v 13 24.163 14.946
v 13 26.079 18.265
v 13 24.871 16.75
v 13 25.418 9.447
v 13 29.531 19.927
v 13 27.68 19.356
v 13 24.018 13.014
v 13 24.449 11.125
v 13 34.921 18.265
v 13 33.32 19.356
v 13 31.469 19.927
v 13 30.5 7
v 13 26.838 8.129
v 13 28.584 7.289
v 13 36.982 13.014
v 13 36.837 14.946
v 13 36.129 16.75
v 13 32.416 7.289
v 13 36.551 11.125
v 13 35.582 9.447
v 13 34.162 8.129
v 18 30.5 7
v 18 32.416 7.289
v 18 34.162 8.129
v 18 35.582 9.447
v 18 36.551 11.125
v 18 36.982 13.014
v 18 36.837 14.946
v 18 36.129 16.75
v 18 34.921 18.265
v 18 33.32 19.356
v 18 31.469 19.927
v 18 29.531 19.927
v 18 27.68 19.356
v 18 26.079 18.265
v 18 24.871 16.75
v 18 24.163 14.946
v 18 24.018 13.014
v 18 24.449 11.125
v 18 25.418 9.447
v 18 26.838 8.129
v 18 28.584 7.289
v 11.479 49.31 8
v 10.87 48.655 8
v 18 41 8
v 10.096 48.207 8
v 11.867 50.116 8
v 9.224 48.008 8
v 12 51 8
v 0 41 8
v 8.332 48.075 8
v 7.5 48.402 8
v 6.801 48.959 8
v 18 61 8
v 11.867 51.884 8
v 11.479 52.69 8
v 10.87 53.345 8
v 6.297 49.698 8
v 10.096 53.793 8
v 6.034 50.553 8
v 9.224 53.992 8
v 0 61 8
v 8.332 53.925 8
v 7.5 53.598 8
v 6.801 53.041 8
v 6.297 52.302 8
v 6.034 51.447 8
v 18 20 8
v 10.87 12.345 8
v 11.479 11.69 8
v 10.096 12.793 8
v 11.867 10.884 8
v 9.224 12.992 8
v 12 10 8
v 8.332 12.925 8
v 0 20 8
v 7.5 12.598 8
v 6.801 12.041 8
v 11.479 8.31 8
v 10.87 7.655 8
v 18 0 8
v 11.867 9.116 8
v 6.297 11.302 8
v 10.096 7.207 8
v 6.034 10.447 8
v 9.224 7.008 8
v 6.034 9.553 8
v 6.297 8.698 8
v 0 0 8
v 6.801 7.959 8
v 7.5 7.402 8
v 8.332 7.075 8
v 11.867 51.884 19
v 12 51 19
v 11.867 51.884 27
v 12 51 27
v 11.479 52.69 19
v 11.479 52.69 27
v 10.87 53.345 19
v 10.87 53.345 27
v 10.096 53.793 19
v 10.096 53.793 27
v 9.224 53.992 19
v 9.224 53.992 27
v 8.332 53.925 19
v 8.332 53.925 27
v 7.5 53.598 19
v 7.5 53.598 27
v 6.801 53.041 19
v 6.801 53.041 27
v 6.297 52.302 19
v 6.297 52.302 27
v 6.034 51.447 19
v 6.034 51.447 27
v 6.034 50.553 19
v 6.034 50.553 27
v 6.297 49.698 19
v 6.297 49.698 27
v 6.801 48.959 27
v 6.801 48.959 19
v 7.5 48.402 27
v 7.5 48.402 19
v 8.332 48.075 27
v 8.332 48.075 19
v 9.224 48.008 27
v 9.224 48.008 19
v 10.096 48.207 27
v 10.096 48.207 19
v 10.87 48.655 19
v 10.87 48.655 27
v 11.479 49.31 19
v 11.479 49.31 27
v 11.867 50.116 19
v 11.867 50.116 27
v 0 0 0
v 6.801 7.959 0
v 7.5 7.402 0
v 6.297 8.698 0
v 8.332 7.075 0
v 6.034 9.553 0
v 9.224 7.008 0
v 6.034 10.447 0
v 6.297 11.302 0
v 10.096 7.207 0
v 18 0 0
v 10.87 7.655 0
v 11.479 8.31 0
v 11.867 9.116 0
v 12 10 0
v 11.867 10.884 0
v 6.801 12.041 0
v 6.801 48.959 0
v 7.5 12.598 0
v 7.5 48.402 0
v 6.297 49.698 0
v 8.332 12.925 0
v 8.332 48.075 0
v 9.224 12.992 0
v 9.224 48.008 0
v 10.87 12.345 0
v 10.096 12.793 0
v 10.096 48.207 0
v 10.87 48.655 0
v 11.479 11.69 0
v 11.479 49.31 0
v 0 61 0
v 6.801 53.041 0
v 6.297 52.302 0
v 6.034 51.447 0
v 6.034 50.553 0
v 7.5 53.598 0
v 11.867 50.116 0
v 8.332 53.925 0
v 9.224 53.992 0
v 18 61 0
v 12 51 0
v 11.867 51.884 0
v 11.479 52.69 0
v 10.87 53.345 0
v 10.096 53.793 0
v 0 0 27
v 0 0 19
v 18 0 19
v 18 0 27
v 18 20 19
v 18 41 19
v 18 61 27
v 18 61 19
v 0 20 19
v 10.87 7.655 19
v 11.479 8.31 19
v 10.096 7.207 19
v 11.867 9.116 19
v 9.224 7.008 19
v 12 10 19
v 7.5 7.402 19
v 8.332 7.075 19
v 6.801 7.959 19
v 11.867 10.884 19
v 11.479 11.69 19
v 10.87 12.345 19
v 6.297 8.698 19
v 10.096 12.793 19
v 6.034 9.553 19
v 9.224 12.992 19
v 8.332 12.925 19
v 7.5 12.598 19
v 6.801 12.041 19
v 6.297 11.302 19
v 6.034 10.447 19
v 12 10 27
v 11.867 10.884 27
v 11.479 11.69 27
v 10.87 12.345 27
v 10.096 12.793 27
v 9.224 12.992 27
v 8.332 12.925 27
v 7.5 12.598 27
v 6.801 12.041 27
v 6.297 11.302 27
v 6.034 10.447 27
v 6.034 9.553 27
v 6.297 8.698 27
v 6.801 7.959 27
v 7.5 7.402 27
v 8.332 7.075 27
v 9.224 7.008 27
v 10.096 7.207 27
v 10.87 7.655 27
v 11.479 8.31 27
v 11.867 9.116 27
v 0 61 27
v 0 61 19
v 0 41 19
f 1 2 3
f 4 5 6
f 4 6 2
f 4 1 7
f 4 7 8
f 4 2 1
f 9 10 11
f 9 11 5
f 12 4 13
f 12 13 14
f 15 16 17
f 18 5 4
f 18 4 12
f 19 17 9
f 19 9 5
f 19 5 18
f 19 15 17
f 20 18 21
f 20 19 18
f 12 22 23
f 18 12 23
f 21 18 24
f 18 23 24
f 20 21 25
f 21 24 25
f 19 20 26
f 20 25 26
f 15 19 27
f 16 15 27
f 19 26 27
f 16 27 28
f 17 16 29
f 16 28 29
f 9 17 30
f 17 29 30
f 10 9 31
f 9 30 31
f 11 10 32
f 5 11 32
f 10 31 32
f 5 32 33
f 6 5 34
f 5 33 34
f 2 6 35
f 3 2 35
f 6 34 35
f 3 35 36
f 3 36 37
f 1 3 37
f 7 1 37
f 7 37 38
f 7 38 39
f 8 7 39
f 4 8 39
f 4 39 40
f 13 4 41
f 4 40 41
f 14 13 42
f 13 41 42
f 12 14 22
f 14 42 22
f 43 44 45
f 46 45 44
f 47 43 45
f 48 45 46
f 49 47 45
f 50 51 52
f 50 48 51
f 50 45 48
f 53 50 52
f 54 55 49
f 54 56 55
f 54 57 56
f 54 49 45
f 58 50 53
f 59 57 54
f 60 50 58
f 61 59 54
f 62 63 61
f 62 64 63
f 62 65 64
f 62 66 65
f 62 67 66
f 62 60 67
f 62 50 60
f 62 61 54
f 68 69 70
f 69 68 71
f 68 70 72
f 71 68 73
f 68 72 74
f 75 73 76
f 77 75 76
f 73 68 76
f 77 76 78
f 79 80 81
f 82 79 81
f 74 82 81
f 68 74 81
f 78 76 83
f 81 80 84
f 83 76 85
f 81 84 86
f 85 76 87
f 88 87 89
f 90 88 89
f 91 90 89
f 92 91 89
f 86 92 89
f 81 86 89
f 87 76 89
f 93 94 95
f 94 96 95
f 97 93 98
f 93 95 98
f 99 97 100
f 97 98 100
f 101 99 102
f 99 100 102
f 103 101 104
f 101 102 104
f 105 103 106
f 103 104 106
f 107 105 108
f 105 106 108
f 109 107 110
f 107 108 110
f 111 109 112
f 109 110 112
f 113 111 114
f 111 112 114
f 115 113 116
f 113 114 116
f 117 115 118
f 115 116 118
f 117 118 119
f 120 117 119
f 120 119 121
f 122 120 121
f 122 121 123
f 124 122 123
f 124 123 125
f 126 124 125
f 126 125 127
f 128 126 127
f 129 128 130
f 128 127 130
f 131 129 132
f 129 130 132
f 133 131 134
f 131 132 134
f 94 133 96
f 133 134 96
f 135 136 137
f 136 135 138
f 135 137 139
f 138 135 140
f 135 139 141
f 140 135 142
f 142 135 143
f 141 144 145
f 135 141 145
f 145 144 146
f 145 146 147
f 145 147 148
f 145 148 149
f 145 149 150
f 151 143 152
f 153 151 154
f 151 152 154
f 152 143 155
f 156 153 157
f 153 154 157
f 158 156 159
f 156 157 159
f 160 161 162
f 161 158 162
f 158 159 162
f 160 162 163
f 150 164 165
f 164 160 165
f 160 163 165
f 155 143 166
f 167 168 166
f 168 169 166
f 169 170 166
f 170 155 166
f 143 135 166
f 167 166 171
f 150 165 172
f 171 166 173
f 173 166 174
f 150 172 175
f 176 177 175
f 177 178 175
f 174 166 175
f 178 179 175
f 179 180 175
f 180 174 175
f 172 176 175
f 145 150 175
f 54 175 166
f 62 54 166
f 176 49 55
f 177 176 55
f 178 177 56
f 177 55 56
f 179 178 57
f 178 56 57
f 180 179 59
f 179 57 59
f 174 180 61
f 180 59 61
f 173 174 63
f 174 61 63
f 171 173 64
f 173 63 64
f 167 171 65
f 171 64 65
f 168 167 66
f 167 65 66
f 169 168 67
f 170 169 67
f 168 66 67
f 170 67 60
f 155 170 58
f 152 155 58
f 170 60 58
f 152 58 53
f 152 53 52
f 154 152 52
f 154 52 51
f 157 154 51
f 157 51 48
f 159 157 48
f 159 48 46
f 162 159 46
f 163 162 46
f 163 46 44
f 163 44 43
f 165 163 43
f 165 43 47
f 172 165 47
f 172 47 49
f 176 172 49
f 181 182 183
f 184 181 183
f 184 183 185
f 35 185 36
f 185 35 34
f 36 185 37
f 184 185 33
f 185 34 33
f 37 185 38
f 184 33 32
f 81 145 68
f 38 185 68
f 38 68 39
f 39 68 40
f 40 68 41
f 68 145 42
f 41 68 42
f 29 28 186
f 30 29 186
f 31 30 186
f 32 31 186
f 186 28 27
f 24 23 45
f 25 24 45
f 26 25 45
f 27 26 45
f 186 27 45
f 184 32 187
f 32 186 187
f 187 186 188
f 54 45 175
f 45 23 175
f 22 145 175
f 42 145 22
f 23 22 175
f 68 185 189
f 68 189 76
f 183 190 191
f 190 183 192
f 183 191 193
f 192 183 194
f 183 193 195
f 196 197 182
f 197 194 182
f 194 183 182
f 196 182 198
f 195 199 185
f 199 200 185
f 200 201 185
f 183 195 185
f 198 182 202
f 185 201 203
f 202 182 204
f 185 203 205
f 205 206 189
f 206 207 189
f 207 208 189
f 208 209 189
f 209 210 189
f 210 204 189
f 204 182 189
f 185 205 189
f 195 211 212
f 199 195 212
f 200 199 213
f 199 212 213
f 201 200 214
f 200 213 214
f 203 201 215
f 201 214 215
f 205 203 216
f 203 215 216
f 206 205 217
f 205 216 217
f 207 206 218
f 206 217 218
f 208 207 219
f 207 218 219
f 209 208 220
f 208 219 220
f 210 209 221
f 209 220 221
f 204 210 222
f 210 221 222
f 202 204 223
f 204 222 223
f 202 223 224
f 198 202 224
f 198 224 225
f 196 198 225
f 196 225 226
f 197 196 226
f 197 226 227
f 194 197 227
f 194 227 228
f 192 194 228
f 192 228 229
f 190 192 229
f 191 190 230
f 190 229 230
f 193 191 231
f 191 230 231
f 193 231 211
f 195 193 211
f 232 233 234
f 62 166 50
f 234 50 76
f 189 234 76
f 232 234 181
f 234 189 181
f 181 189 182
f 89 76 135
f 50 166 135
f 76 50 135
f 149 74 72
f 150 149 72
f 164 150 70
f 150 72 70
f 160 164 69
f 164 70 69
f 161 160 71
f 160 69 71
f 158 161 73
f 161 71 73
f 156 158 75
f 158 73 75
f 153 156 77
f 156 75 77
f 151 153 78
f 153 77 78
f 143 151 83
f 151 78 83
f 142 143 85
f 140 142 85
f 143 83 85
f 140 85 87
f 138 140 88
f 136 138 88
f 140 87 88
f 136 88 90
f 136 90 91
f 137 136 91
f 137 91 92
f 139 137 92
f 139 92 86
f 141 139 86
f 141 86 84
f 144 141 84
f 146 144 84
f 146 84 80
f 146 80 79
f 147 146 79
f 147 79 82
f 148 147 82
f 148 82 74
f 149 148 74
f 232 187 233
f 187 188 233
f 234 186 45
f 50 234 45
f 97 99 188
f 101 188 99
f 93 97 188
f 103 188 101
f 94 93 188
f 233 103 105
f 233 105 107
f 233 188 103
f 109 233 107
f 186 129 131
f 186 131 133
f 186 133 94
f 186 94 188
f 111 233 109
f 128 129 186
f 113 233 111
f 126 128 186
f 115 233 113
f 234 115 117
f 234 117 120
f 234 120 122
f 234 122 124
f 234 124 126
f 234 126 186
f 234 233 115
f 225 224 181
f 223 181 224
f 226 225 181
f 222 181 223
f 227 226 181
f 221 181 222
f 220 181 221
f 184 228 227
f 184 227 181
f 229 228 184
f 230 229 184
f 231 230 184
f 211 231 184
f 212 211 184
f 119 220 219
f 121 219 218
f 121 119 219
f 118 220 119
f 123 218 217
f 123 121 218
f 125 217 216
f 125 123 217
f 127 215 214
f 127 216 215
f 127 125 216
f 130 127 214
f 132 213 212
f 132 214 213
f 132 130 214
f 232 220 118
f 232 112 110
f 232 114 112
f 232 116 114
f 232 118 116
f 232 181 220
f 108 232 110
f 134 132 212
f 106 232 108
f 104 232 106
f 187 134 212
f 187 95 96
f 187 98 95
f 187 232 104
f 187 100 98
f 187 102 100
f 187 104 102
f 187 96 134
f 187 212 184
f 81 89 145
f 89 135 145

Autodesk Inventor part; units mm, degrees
ref_plane "YZ Plane" through (0, 0, 0) normal (1, 0, 0) x (0, 1, 0)
ref_plane "XZ Plane" through (0, 0, 0) normal (0, 1, 0) x (-1, 0, 0)
ref_plane "XY Plane" through (0, 0, 0) normal (0, 0, 1) x (1, 0, 0)
sketch "Sketch1" plane through (0, 0, 0) normal (0, 0, 1) x (1, 0, 0)
  line L0 (0, 0) -> (18, 0)
  line L1 (18, 0) -> (18, 61)
  line L2 (18, 61) -> (0, 61)
  line L3 (0, 61) -> (0, 0)
  dimension "d0" = 18
  dimension "d1" = 61
extrude "Extrusion1" add sketch "Sketch1" along normal blind 27
sketch "Sketch2" plane through (0, 0, 0) normal (-1, 0, 0) x (0, 0, 1)
  line L0 (0, 61) -> (27, 61) projected
  line L1 (8, 61) -> (19, 61)
  line L2 (19, 61) -> (19, 41)
  line L3 (19, 41) -> (8, 41)
  line L4 (8, 41) -> (8, 61)
  line L5 (-7.2771, 30.5) -> (-16.8885, 30.5) construction
  line L6 (0, 61) -> (0, 0) construction
  line L7 (8, 0) -> (19, 0)
  line L8 (19, 0) -> (19, 20)
  line L9 (19, 20) -> (8, 20)
  line L10 (8, 20) -> (8, 0)
  point P0 (-12.0828, 30.5)
  point P1 (0, 30.5)
  point P2 (13.5, 61)
  point P3 (13.5, 61)
  dimension "d4" = 11
  dimension "d5" = 20
extrude "Extrusion2" cut sketch "Sketch2" against normal through all
sketch "Sketch3" plane through (0, 0, 27) normal (0, 0, 1) x (1, 0, 0)
  circle A0 centre (9, 51) radius 3
  line L0 (-26.5753, 30.5) -> (-43.832, 30.5) construction
  line L1 (0, 61) -> (0, 0) construction
  circle A1 centre (9, 10) radius 3
  line L2 (18, 61) -> (0, 61) construction
  line L3 (0, 41) -> (18, 41) construction
  line L4 (18, 61) -> (0, 61) construction
  line L5 (0, 61) -> (0, 41) construction
  line L6 (0, 41) -> (18, 41) construction
  line L7 (18, 41) -> (18, 61) construction
  point P0 (-35.2037, 30.5)
  point P1 (0, 30.5)
  point P2 (0, 51)
  point P3 (9, 61)
  dimension "d8" = 6
extrude "Extrusion3" cut sketch "Sketch3" against normal through all
sketch "Sketch4" plane through (18, 0, 0) normal (1, 0, 0) x (0, 0, -1)
  circle A0 centre (-13.5, 30.5) radius 6.5
  line L0 (-27, 0) -> (-27, 61) projected
  line L1 (-8, 41) -> (-19, 41) projected
  point P0 (0, 0)
  point P1 (-27, 30.5)
  point P2 (-13.5, 41)
  dimension "bearingdiameter" = 13
extrude "Extrusion4" cut sketch "Sketch4" against normal blind 5
properties part number "hinge"
